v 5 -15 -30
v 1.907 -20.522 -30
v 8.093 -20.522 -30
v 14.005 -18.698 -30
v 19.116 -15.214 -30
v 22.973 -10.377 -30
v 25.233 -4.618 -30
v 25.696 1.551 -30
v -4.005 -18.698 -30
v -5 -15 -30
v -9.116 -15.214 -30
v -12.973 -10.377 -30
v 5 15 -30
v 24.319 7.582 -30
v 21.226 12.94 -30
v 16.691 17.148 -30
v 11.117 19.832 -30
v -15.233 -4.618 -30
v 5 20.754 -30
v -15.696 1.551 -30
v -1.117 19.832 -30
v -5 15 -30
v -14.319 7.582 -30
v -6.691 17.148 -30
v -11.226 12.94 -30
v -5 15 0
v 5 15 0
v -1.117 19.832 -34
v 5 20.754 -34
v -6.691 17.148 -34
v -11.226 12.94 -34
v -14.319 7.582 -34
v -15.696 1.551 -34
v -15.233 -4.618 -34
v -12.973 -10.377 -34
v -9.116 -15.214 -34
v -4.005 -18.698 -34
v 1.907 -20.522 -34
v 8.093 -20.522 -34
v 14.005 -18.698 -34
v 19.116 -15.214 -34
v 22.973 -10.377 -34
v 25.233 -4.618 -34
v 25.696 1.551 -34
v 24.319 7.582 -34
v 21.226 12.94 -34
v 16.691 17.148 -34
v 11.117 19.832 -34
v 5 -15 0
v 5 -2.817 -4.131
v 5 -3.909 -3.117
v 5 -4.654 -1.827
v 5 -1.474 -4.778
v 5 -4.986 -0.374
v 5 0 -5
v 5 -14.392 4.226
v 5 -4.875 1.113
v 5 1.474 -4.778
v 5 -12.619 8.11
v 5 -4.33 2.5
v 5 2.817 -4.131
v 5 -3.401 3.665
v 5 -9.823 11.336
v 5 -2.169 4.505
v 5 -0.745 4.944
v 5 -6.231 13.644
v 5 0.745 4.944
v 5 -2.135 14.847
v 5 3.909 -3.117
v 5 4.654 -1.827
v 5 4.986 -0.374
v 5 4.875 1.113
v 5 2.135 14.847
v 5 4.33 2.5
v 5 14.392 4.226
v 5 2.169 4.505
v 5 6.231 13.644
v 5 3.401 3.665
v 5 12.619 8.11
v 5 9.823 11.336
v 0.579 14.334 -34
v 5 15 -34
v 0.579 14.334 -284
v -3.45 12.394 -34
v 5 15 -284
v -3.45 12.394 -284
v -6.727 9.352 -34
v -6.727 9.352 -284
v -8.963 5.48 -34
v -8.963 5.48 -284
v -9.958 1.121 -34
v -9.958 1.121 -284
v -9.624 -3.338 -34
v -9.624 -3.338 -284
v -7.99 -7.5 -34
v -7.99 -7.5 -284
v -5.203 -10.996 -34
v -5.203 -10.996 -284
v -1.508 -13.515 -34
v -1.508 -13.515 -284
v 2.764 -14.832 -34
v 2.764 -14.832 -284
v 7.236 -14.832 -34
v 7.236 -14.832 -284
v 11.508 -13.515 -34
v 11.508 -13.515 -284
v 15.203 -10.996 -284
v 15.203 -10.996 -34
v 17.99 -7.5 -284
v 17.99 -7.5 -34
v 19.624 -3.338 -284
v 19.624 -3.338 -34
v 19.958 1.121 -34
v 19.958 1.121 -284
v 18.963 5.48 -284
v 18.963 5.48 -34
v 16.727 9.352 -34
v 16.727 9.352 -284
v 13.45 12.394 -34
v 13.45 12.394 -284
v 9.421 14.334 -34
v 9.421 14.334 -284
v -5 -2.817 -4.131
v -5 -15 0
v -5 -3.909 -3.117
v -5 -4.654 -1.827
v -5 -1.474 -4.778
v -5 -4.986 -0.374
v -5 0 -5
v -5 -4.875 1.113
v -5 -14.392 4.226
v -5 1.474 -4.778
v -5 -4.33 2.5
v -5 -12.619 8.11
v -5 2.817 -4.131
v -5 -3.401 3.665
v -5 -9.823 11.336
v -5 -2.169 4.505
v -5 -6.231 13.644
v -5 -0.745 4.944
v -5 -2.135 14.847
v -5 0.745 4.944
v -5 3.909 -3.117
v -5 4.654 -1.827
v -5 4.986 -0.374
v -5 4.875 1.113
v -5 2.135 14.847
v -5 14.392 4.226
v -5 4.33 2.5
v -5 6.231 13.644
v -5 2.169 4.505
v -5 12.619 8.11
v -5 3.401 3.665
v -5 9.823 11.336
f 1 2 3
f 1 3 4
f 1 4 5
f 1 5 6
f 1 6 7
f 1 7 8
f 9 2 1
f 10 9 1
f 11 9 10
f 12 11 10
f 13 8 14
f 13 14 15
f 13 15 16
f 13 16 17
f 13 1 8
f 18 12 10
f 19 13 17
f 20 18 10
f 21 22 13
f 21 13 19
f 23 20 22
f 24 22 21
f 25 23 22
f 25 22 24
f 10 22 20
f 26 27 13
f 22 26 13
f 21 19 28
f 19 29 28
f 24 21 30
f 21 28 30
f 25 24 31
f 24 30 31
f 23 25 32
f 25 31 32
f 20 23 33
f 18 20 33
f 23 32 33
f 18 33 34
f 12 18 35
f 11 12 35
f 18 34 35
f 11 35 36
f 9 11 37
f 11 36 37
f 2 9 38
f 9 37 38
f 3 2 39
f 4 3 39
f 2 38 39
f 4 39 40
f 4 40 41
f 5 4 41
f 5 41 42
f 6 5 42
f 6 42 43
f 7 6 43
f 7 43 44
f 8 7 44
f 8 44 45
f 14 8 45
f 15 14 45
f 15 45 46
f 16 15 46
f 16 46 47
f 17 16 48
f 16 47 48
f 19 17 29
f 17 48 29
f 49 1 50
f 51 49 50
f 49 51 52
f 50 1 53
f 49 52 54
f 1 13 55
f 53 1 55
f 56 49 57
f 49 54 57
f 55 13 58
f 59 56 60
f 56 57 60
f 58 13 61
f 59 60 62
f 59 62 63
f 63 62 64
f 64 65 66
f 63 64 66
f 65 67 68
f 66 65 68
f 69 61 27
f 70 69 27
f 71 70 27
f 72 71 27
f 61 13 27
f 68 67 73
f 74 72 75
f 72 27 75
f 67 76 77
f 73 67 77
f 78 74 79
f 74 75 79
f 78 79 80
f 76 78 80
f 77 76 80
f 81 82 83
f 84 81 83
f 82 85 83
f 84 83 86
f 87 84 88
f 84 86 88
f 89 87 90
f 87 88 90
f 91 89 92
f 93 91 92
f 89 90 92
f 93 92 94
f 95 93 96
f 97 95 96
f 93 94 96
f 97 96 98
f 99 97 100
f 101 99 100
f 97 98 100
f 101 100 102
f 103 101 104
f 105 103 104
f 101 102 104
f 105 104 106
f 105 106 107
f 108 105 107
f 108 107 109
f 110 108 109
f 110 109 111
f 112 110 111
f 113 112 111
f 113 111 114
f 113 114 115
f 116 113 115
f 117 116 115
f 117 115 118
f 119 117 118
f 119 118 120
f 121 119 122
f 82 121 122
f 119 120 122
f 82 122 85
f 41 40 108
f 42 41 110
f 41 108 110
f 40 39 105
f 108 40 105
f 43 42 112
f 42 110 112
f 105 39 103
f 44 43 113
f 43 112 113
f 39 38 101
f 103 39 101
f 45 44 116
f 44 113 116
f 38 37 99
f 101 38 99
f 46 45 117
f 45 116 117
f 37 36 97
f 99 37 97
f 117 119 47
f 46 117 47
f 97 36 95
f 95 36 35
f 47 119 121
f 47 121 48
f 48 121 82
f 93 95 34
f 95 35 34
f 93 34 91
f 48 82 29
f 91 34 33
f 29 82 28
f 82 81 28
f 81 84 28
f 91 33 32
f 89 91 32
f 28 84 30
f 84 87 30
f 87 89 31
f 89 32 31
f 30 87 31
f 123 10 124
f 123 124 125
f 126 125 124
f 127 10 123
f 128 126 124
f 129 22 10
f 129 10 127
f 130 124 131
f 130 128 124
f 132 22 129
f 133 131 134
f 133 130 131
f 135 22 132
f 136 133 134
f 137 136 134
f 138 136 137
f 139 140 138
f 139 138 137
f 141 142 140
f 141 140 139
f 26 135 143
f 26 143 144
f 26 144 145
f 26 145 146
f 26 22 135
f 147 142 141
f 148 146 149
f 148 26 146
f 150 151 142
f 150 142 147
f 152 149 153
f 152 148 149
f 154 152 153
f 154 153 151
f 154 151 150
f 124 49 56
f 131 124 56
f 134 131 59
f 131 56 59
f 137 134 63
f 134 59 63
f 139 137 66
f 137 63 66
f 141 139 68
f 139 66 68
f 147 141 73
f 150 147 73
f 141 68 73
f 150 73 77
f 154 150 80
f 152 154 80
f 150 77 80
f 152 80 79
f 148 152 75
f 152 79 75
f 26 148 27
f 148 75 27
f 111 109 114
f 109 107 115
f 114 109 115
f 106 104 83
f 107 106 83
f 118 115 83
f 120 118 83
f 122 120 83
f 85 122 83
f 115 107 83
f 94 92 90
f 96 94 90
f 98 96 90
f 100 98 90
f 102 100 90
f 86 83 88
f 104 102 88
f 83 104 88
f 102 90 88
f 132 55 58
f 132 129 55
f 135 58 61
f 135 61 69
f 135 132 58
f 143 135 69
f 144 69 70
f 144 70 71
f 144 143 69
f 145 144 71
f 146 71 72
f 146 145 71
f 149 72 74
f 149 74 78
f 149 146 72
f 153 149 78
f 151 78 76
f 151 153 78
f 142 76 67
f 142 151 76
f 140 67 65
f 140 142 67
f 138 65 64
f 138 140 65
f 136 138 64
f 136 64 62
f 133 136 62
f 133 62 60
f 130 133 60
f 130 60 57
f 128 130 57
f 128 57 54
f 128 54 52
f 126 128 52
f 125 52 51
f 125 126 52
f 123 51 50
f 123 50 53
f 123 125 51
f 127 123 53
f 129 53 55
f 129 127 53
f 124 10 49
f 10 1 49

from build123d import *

# Parameters (mm, degrees)
SKETCH1_R           = 5
BOSS_EXTRUDE1_DEPTH = 5


with BuildPart() as part:
    # Sketch1 → Boss-Extrude1 (new body, symmetric)
    with BuildSketch(Plane(origin=(0, 0, 0), x_dir=(0, 0, -1), z_dir=(1, 0, 0))):
        with BuildLine():
            Line((0, 15), (30, 15))
            Line((30, 15), (30, -15))
            Line((30, -15), (0, -15))
            ThreePointArc((0, -15), (-15, 0), (0, 15))
        make_face()
        Circle(SKETCH1_R, mode=Mode.SUBTRACT)
    extrude(amount=BOSS_EXTRUDE1_DEPTH, both=True)

    # Sketch3 → Revolve1 (revolve)
    with BuildSketch(Plane(origin=(5, 0, 0), x_dir=(0, 0, -1), z_dir=(1, 0, 0))):
        Polygon((30, 15), (30, 20.753758682), (33.999504278, 20.753758682), (33.999504278, 15), (283.999504278, 15), (283.999504278, 0), (30, 0), align=None)
    revolve(axis=Axis((5, 0, -283.999504278), (0, 0, 1)))


solid = part.part
